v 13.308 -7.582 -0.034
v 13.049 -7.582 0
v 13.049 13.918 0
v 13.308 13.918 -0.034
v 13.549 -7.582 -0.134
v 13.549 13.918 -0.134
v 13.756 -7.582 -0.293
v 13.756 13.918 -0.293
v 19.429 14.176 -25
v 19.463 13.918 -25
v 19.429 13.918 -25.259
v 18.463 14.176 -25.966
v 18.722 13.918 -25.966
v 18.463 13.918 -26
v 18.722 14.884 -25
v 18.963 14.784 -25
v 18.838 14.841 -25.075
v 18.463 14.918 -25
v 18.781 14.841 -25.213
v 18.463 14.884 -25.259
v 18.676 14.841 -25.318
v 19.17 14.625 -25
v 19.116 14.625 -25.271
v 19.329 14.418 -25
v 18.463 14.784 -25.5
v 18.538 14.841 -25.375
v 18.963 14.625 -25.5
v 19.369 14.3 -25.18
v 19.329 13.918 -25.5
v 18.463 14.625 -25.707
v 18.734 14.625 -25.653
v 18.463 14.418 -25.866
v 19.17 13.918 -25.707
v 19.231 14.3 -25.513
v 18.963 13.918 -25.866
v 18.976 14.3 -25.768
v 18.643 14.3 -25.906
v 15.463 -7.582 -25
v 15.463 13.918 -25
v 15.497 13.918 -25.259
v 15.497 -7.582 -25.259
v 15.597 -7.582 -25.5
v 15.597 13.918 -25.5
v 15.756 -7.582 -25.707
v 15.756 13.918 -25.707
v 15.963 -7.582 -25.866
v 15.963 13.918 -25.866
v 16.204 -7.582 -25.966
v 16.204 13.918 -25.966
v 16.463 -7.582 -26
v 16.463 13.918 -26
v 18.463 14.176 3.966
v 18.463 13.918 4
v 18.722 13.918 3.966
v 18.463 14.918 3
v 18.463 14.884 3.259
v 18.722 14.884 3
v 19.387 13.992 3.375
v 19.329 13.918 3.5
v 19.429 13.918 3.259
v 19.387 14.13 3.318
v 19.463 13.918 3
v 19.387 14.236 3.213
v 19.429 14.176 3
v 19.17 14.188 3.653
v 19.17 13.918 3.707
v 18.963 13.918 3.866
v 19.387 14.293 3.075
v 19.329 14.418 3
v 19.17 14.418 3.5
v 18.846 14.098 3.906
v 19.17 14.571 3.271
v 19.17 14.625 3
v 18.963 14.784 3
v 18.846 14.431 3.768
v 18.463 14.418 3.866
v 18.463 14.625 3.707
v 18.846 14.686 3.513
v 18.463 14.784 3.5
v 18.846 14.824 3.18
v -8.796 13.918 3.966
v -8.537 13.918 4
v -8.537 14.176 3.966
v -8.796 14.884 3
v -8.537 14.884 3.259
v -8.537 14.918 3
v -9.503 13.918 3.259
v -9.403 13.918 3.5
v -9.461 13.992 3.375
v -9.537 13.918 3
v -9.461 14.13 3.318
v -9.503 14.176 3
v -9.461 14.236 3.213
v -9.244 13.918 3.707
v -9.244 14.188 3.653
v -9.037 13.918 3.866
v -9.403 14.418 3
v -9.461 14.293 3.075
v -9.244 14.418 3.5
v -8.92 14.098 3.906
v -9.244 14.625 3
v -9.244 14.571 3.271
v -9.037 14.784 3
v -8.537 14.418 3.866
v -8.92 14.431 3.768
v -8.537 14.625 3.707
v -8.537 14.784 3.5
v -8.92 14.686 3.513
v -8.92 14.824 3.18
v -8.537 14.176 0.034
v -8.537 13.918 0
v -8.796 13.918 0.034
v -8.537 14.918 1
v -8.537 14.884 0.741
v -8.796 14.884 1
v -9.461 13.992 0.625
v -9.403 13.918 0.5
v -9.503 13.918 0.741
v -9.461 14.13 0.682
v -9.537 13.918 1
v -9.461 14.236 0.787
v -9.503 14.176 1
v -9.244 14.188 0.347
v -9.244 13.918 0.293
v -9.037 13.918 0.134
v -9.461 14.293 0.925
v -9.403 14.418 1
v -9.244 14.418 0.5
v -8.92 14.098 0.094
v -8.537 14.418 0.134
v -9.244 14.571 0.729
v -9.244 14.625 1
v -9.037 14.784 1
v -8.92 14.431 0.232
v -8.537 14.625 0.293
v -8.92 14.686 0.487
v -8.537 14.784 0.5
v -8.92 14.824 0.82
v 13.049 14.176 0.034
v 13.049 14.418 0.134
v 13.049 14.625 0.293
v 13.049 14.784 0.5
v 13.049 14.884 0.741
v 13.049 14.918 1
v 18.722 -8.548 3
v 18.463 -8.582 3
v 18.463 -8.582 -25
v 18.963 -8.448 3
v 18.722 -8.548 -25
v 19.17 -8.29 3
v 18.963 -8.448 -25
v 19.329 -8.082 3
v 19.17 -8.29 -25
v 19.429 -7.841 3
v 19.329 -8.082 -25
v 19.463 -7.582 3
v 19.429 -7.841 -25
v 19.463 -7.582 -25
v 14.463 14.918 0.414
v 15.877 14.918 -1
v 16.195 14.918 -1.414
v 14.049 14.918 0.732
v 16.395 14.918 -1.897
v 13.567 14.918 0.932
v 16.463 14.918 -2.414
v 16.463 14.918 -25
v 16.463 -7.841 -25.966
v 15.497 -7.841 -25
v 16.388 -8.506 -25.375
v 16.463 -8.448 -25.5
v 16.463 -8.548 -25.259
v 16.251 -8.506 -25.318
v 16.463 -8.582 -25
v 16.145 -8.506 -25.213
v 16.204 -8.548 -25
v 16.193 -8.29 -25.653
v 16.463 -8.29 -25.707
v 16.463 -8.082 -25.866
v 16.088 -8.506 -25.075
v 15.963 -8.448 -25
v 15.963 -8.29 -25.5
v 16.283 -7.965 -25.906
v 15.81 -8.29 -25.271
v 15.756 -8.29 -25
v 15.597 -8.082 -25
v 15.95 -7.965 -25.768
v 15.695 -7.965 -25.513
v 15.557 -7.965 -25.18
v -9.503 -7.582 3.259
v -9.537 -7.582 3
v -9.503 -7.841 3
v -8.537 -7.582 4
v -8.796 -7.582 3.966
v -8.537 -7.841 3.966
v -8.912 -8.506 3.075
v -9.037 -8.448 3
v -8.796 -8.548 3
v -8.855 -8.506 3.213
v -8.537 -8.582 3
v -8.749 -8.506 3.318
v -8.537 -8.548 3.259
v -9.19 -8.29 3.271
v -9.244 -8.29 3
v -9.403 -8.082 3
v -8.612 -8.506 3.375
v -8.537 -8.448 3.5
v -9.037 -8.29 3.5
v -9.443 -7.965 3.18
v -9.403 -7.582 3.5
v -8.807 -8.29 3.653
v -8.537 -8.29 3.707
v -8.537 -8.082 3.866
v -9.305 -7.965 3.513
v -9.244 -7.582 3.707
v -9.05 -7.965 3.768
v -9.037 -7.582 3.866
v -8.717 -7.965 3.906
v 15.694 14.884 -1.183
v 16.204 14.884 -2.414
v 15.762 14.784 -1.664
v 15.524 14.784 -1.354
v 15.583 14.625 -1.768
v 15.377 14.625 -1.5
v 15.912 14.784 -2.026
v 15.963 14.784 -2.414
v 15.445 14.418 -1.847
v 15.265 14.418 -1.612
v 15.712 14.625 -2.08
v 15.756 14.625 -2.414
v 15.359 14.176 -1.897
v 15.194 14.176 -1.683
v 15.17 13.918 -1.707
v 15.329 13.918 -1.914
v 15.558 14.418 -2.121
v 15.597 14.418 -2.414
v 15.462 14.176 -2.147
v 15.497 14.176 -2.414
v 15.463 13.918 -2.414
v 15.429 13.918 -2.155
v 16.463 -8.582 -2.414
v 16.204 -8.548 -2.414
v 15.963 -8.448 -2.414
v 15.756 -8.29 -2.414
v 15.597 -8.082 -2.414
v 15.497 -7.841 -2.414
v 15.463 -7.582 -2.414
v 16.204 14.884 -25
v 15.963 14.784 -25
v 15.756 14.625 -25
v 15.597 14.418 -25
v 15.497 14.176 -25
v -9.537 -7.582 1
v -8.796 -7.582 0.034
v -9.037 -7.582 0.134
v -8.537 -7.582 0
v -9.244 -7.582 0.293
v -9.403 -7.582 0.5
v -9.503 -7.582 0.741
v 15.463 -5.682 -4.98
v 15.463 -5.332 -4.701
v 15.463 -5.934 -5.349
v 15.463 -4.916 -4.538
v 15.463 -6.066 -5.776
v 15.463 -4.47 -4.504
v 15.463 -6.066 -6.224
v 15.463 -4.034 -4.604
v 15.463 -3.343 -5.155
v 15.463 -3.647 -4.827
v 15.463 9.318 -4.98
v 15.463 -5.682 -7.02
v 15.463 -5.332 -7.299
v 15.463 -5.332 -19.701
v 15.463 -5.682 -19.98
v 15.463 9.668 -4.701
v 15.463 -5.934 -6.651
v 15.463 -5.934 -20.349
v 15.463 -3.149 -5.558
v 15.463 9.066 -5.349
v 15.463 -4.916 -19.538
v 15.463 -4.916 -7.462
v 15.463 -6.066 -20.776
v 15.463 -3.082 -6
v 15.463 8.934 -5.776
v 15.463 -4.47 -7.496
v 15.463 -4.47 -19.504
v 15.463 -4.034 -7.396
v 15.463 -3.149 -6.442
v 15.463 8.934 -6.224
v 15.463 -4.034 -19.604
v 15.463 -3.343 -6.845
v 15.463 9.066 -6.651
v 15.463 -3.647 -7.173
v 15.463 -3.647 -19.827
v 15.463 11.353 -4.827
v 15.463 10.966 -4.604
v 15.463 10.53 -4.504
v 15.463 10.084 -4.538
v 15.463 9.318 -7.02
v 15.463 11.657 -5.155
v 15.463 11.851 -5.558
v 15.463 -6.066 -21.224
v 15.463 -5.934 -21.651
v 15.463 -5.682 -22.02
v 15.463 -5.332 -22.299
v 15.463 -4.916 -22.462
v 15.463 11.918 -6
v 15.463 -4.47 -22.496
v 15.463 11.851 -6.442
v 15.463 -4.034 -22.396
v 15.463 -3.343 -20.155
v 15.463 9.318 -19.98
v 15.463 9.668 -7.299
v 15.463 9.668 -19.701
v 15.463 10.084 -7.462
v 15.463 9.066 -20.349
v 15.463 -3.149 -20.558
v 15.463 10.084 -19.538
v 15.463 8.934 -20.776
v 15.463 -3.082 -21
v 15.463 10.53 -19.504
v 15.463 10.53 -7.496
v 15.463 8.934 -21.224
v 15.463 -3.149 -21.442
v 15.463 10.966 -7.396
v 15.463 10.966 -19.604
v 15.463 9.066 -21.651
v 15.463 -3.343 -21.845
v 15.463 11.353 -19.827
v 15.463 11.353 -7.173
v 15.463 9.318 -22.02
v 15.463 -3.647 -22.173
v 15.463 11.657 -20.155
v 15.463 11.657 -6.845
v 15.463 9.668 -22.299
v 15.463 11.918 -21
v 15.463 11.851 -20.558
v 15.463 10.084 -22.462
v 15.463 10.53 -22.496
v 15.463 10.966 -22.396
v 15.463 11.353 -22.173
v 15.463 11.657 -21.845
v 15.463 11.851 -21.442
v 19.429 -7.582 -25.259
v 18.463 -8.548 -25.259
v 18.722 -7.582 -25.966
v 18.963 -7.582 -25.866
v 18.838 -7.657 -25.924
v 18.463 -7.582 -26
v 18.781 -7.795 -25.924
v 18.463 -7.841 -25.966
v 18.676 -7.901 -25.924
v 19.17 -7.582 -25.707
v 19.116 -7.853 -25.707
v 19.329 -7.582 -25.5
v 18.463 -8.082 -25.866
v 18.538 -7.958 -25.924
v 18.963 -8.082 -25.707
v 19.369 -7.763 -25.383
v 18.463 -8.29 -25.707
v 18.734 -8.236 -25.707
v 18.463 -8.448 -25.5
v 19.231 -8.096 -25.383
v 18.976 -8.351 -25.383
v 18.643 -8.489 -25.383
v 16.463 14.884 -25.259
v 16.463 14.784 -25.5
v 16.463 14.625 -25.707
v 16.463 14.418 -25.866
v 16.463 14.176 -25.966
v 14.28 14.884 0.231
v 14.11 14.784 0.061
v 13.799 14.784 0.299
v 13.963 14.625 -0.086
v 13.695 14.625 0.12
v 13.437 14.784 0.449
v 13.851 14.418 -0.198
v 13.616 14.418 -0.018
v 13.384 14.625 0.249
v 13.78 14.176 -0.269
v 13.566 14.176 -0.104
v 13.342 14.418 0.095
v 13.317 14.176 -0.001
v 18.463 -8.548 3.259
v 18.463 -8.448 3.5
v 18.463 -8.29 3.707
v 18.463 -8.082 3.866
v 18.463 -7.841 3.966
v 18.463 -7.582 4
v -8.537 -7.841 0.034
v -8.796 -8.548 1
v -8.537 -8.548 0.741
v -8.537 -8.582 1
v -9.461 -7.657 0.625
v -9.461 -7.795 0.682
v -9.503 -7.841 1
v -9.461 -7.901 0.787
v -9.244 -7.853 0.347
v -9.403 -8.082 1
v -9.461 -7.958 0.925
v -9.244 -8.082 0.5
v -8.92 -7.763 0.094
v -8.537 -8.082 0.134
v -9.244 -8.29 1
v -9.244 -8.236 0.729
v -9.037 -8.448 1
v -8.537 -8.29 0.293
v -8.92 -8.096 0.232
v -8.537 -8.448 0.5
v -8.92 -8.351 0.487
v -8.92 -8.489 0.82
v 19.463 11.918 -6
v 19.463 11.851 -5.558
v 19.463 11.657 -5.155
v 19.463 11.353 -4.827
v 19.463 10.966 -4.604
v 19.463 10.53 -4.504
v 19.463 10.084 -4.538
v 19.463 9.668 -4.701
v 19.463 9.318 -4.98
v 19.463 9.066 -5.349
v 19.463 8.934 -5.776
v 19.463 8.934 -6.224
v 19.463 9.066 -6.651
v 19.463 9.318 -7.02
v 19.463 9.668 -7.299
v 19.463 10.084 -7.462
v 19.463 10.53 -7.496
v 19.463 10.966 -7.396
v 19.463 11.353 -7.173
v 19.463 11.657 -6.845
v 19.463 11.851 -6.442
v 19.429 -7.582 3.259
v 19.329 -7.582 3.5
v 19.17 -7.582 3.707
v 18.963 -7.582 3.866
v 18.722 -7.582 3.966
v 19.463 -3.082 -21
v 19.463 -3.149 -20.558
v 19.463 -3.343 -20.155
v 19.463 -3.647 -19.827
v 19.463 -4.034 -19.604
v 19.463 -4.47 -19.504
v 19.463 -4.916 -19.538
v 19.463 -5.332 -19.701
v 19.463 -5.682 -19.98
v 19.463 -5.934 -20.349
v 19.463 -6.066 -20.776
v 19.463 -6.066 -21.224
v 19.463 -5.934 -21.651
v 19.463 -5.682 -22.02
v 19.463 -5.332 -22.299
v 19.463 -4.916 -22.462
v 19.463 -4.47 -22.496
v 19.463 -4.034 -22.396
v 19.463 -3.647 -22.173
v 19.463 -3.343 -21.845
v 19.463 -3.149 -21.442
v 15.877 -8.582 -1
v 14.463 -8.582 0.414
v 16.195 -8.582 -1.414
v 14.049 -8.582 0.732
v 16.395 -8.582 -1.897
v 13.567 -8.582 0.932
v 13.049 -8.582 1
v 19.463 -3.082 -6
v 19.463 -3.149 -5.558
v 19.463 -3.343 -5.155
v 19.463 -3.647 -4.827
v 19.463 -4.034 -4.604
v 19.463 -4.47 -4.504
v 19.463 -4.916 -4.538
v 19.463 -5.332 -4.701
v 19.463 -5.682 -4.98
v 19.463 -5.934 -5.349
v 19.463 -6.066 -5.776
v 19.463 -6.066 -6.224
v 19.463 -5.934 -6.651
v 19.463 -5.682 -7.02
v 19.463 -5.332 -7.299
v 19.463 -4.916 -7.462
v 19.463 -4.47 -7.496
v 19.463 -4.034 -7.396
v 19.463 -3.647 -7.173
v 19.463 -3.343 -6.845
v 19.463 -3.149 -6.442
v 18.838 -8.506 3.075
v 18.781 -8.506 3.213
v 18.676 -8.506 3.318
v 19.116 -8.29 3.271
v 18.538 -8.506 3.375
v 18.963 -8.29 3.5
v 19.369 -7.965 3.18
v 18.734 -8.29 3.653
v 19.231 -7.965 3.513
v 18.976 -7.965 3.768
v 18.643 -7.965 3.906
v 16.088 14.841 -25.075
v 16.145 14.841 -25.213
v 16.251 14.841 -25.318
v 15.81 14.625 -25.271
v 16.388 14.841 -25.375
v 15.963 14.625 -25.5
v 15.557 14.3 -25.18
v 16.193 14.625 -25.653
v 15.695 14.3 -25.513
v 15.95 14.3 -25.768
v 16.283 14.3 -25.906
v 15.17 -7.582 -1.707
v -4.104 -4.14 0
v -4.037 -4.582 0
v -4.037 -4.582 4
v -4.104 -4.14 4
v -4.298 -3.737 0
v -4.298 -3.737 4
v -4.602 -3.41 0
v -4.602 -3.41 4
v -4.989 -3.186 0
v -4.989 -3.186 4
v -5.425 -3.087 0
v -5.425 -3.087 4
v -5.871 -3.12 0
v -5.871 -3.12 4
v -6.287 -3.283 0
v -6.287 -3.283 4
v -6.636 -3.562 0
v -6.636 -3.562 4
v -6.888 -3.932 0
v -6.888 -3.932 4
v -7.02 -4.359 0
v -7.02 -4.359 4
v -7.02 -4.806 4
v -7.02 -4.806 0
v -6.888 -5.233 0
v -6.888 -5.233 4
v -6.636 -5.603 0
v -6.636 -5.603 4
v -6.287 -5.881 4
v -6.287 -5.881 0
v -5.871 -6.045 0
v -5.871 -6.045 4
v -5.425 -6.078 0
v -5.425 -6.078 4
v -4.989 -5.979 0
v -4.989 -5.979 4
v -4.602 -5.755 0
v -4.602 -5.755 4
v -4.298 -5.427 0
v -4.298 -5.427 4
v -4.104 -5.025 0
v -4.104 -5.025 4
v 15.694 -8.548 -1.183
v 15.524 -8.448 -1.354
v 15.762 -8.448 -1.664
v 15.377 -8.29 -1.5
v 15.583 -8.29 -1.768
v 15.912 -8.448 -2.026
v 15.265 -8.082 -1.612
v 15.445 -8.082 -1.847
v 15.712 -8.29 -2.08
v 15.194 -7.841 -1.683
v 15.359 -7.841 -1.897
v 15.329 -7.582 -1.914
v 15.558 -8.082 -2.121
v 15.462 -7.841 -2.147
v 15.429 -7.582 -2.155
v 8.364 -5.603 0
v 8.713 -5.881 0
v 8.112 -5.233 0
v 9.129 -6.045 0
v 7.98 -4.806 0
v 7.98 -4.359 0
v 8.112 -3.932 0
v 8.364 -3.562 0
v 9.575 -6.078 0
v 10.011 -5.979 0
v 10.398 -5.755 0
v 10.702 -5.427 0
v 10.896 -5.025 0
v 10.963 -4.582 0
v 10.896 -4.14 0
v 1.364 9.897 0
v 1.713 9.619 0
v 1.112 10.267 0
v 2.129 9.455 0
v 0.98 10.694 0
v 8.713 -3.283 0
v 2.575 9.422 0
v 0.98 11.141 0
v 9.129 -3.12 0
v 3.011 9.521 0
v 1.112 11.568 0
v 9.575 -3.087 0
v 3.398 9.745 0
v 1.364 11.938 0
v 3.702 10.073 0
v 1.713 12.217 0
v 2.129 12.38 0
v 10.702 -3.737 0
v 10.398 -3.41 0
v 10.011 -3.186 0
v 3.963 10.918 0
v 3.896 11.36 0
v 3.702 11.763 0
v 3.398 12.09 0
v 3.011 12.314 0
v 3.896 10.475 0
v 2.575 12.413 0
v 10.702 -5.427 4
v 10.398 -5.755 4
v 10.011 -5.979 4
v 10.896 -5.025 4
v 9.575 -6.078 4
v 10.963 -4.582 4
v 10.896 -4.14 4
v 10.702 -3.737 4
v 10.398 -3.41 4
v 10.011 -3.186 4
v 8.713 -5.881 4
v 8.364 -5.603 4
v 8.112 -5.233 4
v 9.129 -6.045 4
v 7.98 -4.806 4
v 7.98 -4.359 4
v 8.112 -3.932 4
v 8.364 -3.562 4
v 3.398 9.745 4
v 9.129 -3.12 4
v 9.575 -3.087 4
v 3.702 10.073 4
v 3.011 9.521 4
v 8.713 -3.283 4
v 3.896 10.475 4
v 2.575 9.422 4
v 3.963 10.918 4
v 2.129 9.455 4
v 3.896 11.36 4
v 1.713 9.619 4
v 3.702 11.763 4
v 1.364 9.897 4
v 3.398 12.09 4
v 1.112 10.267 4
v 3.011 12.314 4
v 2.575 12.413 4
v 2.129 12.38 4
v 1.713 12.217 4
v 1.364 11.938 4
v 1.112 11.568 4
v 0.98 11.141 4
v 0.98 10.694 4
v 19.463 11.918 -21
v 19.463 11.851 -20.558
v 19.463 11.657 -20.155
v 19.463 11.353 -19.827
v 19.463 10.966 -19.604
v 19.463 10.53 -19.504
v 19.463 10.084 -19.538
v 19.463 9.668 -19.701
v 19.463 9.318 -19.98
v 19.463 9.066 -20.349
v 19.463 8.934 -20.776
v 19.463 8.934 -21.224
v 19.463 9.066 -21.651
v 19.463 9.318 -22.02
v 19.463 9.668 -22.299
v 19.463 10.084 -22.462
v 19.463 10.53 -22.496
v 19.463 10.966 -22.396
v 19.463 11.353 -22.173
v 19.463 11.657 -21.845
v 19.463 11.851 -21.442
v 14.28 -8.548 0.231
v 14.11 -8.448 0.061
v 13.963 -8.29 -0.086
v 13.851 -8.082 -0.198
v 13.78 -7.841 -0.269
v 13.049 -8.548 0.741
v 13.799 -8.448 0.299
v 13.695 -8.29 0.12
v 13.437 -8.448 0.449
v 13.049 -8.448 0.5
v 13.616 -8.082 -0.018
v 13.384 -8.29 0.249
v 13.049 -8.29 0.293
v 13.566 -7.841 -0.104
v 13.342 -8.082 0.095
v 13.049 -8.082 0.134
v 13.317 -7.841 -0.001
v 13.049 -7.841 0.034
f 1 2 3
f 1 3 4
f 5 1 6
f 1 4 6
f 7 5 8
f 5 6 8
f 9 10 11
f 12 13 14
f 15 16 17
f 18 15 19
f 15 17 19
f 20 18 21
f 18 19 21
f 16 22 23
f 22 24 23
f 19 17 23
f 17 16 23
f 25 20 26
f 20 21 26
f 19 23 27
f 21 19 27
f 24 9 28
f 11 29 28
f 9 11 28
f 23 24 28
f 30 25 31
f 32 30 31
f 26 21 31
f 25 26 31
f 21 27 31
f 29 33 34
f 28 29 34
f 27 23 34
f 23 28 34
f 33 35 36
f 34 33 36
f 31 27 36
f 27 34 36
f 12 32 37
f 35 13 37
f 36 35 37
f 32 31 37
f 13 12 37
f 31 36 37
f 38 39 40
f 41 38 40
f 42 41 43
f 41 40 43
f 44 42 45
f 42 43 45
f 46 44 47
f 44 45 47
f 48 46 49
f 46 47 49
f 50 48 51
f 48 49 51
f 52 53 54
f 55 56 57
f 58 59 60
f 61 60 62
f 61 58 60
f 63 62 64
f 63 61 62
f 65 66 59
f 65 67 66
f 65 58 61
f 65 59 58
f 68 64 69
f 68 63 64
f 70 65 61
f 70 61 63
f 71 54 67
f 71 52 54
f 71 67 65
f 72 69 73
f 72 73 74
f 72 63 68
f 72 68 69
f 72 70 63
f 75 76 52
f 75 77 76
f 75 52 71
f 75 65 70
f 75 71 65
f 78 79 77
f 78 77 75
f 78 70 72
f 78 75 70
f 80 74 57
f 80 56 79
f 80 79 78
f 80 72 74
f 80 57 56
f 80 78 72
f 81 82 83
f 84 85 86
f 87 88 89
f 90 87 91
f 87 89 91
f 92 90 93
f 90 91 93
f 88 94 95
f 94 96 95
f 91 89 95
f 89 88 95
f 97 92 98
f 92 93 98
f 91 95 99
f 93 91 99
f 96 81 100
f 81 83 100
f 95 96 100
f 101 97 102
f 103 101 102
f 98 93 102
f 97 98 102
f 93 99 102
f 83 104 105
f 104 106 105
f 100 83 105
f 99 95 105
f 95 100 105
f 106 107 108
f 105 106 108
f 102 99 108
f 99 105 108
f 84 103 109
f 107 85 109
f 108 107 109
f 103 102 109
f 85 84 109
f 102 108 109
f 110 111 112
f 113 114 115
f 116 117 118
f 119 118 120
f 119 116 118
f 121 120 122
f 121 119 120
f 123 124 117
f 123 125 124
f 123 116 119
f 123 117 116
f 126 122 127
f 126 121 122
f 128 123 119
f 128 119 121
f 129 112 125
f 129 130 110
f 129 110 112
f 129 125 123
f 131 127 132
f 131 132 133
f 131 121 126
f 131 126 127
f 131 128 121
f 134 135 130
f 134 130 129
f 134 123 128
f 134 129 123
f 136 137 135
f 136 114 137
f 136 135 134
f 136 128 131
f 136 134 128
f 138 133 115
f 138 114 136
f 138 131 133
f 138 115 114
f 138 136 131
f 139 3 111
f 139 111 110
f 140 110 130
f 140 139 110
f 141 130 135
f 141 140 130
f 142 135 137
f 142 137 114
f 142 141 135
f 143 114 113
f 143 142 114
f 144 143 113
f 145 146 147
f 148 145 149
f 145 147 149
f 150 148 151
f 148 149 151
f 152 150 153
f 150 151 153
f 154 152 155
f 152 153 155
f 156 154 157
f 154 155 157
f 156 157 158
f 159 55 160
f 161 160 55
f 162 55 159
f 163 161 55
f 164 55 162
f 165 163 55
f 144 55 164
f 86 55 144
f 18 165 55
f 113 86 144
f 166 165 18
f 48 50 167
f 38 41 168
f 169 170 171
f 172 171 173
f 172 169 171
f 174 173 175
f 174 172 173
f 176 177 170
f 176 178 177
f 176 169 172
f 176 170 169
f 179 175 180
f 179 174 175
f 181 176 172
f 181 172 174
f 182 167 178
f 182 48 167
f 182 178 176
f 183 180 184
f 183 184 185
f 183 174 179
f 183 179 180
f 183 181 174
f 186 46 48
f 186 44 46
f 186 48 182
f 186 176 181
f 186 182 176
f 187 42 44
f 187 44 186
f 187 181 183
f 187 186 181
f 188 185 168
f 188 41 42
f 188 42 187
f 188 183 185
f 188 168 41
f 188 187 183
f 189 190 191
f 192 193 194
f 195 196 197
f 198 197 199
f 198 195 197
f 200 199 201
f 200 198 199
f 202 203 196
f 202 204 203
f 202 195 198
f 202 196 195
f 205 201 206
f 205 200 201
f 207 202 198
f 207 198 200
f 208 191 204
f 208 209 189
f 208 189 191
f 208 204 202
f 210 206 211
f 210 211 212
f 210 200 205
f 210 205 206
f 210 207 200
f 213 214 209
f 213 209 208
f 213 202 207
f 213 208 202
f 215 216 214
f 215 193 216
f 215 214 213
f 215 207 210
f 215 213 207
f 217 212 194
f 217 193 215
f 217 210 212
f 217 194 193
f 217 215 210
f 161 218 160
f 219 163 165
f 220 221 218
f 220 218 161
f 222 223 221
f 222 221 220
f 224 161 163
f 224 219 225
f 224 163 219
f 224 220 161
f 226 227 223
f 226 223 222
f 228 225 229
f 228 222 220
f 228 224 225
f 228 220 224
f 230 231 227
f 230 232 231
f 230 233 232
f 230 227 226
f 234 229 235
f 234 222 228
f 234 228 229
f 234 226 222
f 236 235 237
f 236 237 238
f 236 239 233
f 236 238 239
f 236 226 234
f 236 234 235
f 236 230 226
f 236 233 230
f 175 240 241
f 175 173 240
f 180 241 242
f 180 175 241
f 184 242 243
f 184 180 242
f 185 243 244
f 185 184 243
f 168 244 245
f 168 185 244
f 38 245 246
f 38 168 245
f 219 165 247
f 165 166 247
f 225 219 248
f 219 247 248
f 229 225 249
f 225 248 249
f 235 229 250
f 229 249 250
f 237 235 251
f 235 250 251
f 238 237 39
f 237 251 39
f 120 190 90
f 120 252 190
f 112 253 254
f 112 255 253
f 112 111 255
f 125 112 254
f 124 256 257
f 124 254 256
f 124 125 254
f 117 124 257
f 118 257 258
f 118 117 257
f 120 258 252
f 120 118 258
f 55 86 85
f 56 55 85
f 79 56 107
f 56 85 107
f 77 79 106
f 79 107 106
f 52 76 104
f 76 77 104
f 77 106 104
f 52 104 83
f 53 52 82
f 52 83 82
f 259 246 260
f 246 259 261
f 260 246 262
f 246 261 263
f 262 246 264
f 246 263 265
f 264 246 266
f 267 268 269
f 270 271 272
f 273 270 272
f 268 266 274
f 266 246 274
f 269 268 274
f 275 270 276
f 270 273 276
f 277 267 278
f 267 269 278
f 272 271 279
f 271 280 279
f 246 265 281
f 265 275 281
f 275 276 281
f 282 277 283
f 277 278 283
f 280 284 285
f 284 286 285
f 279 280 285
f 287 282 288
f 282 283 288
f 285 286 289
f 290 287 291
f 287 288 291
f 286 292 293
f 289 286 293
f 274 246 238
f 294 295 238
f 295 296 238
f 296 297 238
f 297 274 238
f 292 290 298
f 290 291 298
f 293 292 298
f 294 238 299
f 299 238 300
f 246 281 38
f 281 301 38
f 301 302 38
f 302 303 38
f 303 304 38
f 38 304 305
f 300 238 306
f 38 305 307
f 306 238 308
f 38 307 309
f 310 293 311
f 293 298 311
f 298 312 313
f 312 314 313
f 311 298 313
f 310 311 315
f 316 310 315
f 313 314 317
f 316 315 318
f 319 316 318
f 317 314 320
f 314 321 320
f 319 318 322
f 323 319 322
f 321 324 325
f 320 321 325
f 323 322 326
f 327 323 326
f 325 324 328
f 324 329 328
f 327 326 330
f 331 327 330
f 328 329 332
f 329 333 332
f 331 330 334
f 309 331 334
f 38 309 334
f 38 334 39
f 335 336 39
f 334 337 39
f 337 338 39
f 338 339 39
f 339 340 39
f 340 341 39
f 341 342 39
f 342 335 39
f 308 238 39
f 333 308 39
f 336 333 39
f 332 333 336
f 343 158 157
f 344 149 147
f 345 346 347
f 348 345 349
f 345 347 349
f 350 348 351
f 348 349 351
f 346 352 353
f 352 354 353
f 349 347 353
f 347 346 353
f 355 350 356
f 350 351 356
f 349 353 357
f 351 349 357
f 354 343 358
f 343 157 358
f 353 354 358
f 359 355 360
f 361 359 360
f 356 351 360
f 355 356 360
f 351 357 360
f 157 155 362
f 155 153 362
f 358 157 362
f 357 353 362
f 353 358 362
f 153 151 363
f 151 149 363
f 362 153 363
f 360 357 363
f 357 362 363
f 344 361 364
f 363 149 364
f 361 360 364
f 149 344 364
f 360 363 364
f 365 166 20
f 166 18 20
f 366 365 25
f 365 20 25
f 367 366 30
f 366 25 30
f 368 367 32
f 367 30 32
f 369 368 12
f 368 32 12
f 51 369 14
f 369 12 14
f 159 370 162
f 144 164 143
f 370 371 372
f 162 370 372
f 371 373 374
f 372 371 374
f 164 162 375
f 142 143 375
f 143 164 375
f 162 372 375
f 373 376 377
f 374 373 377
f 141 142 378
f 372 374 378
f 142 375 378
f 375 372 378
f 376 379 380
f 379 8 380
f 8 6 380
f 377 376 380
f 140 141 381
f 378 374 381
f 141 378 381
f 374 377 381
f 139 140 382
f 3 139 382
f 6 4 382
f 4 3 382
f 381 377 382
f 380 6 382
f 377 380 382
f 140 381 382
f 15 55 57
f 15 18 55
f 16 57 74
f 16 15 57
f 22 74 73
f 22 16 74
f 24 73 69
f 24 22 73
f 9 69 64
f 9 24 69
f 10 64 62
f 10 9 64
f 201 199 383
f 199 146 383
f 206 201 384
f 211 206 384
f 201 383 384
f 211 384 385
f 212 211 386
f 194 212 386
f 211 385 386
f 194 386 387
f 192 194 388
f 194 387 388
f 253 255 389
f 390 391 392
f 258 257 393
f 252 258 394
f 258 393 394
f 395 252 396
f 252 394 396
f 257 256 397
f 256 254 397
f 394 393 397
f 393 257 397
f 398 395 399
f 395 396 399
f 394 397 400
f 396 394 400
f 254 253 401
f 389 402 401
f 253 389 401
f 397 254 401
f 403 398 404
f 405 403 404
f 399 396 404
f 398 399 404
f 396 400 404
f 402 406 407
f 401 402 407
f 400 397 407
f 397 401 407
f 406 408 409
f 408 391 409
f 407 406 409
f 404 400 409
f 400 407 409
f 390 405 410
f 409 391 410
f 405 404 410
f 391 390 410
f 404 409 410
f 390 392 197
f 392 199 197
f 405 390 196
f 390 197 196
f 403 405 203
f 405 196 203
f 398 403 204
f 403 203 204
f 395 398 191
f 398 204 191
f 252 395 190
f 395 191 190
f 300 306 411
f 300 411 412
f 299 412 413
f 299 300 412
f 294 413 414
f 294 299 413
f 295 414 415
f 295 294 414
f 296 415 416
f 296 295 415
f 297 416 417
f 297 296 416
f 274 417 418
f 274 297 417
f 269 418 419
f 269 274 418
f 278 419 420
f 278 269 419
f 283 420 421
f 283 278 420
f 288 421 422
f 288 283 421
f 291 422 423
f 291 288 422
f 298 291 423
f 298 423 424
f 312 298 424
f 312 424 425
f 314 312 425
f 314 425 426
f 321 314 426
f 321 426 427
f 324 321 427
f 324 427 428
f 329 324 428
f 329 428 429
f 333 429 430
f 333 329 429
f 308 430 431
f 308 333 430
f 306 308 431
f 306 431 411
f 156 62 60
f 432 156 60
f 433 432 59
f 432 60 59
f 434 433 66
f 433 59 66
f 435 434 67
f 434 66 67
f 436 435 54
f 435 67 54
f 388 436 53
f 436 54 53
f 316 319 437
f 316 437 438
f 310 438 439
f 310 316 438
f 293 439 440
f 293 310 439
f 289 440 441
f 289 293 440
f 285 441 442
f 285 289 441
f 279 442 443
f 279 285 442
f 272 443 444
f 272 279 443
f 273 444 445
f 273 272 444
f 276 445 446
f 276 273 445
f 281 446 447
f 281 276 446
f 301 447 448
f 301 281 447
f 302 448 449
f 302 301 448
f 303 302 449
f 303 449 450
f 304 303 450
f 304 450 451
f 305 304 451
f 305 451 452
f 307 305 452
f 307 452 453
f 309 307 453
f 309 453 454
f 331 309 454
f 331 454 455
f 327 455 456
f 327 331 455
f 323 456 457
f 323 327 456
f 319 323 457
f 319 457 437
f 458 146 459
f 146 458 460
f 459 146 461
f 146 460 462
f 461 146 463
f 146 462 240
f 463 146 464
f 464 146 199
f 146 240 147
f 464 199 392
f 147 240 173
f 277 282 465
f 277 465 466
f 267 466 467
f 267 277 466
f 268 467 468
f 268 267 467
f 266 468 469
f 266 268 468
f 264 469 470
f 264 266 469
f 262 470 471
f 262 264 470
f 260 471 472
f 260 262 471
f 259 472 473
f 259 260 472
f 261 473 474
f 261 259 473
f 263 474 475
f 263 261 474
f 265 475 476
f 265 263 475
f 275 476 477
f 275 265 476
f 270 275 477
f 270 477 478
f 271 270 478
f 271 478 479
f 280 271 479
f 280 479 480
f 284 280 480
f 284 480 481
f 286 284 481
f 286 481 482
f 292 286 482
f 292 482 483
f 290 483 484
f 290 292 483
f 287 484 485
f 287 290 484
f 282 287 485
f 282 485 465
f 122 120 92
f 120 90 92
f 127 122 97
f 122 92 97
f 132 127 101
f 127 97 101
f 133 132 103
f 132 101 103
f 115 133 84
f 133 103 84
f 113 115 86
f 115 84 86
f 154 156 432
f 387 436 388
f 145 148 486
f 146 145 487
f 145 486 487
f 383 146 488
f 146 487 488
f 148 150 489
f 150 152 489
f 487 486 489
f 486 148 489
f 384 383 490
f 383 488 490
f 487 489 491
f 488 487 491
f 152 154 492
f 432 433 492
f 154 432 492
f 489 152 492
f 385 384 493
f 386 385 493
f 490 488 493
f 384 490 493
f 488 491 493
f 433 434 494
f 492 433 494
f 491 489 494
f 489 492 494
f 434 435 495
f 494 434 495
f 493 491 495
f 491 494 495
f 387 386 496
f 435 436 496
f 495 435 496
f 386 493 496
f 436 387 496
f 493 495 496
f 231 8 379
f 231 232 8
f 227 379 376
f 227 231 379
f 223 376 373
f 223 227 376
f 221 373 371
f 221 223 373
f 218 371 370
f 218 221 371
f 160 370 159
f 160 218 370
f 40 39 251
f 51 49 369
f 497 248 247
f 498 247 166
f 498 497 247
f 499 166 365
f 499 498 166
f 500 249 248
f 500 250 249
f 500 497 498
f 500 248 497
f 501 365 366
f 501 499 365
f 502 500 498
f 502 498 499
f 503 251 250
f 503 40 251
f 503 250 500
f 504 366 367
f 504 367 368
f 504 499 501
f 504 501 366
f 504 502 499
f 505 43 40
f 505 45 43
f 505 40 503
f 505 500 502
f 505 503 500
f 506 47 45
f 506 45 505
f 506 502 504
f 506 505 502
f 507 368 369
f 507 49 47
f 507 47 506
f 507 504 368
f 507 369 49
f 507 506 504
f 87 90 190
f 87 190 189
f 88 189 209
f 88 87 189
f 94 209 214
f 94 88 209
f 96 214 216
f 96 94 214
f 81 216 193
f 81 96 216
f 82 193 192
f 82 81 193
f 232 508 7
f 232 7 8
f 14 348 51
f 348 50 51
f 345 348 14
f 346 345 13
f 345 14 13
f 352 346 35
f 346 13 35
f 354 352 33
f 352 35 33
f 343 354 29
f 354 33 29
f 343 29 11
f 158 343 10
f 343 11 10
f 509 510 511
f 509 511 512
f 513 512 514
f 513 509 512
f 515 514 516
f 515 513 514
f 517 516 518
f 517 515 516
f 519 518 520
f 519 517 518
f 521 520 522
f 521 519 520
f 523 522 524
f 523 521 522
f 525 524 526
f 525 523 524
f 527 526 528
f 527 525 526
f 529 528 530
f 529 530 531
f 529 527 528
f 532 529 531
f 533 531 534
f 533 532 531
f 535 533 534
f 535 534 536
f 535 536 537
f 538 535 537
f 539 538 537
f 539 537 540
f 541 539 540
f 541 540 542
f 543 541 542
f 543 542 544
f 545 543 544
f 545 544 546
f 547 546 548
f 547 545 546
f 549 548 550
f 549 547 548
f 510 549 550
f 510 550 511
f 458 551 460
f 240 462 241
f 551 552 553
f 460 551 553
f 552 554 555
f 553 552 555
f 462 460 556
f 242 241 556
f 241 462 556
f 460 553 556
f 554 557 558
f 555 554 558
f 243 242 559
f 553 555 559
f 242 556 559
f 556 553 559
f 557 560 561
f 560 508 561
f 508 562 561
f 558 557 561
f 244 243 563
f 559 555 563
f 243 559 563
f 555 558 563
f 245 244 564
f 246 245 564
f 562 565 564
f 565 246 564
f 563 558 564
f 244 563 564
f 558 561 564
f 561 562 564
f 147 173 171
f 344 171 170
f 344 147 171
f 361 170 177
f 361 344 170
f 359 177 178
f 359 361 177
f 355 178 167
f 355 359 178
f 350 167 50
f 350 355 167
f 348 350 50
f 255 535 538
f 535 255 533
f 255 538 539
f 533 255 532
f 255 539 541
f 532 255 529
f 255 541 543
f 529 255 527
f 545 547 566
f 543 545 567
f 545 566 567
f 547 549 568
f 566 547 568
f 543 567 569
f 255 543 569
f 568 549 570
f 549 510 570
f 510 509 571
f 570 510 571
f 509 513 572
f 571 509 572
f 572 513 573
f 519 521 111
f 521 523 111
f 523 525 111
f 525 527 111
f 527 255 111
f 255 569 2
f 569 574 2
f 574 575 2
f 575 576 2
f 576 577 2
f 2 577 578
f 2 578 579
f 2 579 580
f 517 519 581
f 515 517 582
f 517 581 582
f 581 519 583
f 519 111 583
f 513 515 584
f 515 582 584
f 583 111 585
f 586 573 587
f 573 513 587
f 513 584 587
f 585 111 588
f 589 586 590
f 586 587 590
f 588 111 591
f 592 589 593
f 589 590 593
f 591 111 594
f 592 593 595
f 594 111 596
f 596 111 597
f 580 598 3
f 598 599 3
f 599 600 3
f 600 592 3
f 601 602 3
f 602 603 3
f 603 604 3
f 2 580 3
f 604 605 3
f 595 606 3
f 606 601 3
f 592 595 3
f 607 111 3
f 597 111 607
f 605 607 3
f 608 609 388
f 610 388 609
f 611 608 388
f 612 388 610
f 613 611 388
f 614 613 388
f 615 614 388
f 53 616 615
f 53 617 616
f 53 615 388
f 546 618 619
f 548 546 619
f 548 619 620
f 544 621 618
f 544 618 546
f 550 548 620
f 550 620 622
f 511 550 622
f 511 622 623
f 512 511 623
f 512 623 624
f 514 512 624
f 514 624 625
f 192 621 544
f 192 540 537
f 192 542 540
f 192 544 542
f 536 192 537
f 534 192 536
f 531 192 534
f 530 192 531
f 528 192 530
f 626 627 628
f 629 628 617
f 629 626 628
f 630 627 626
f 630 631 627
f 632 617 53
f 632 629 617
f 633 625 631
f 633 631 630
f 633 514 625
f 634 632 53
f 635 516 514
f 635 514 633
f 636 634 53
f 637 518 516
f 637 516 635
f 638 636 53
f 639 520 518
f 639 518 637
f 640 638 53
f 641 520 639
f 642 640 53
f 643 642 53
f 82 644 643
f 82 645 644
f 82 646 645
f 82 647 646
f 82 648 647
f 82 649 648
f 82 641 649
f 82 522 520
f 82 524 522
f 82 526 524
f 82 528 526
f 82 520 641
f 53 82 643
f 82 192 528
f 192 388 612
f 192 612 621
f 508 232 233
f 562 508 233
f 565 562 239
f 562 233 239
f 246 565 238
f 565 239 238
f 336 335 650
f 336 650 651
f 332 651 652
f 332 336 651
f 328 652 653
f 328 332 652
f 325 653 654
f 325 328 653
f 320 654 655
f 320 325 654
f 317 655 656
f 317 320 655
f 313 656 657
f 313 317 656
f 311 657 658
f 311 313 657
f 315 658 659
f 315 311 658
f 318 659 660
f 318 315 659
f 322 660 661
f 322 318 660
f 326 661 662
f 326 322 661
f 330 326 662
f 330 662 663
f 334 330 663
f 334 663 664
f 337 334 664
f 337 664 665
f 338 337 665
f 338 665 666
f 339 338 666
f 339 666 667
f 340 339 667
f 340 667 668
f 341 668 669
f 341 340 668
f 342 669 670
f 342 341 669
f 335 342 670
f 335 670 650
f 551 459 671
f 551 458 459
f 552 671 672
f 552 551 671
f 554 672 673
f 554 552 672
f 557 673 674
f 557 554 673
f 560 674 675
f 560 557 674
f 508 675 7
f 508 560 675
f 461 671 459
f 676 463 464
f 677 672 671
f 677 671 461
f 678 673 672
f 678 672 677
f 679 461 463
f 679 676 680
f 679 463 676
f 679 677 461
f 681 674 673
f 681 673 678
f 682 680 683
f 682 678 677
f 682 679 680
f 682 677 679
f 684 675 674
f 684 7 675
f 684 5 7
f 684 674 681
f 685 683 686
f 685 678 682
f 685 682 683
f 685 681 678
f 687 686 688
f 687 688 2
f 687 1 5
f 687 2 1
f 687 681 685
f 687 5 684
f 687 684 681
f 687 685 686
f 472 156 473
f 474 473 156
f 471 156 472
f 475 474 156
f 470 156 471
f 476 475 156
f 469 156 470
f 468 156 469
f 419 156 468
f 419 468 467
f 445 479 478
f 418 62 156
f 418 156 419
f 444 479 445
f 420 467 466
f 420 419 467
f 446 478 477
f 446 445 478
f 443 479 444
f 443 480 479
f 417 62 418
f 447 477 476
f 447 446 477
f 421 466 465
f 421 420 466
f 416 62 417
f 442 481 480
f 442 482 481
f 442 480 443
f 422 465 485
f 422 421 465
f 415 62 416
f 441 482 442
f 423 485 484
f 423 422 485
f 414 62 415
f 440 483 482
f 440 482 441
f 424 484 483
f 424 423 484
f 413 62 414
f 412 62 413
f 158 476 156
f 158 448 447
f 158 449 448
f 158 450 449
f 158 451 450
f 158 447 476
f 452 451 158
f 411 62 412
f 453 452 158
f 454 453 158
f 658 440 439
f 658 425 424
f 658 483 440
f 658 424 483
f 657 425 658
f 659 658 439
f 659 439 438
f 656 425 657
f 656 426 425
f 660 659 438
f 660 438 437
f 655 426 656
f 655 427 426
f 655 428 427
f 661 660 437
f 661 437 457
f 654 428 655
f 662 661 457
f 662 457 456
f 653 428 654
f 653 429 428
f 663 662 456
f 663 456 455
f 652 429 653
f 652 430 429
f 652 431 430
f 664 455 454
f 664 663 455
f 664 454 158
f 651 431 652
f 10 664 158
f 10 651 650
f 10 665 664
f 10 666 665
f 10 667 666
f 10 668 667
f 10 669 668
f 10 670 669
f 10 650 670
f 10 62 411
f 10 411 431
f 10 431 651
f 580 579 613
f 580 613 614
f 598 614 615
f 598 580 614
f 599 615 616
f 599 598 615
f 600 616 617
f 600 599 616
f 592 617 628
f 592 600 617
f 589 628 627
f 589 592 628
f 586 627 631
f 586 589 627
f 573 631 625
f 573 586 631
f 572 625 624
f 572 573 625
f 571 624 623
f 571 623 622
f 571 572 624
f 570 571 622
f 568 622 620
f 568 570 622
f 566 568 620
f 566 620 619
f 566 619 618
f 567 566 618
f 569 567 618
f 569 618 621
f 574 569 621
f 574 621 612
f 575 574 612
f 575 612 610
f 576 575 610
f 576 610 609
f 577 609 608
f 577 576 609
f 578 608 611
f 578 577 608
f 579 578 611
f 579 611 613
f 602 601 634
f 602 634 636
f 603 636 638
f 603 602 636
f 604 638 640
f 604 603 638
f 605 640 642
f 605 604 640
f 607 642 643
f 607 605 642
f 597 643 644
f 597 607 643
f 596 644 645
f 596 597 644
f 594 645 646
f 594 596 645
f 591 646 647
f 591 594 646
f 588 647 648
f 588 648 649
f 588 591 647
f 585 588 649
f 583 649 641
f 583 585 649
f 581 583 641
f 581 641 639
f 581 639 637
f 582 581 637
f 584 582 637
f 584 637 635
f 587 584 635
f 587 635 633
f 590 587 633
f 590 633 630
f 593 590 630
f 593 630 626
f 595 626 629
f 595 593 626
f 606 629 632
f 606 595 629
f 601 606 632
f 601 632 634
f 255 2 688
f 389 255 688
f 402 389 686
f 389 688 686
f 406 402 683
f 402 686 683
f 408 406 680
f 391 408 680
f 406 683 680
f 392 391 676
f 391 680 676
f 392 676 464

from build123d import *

# Parameters (mm, degrees)
SKETCH_1_W      = 25
SKETCH_1_H      = 23.5
SKETCH_1_R      = 1.5
EXTRUDE_1_DEPTH = 4
SKETCH_2_W      = 30
SKETCH_2_H      = 23.5
SKETCH_2_R      = 1.5
EXTRUDE_2_DEPTH = 4
CHAMFER_1_SIZE  = 2
FILLET_1_R      = 1


with BuildPart() as part:
    # 草图1 → 凸台-拉伸1 (new body)
    with BuildSketch(Plane.XY):
        with Locations((2.963131814, 3.167575845)):
            Rectangle(SKETCH_1_W, SKETCH_1_H)
        with Locations((2.463131814, 10.917575845)):
            Circle(SKETCH_1_R, mode=Mode.SUBTRACT)
        with Locations((-5.536868186, -4.582424155)):
            Circle(SKETCH_1_R, mode=Mode.SUBTRACT)
        with Locations((9.463131814, -4.582424155)):
            Circle(SKETCH_1_R, mode=Mode.SUBTRACT)
    extrude(amount=EXTRUDE_1_DEPTH)

    # 草图2 → 凸台-拉伸2 (add)
    with BuildSketch(Plane(origin=(15.463131814, 0, 0), x_dir=(0, 0, -1), z_dir=(1, 0, 0))):
        with Locations((11, 3.167575845)):
            Rectangle(SKETCH_2_W, SKETCH_2_H)
        with Locations(Location((6, 10.417575845, 0), (0, 0, 90))):
            Circle(SKETCH_2_R, mode=Mode.SUBTRACT)
        with Locations(Location((21, 10.417575845, 0), (0, 0, 90))):
            Circle(SKETCH_2_R, mode=Mode.SUBTRACT)
        with Locations(Location((6, -4.582424155, 0), (0, 0, 90))):
            Circle(SKETCH_2_R, mode=Mode.SUBTRACT)
        with Locations(Location((21, -4.582424155, 0), (0, 0, 90))):
            Circle(SKETCH_2_R, mode=Mode.SUBTRACT)
    extrude(amount=EXTRUDE_2_DEPTH)

    # 倒角1
    chamfer_1_edges = [part.edges().sort_by_distance(p)[0] for p in [
        (15.463131814, 3.167575845, 0),
    ]]
    chamfer(chamfer_1_edges, length=CHAMFER_1_SIZE)

    # 圆角1
    fillet_1_edges = [part.edges().sort_by_distance(p)[0] for p in [
        (4.963131814, 14.917575845, 4),
        (19.463131814, 3.167575845, 4),
        (19.463131814, -8.582424155, -11),
        (19.463131814, 3.167575845, -26),
        (19.463131814, 14.917575845, -11),
        (15.463131814, 3.167575845, -26),
        (17.463131814, -8.582424155, -26),
        (15.463131814, 14.917575845, -14),
        (17.463131814, 14.917575845, -26),
        (15.463131814, -8.582424155, -14),
        (15.463131814, 3.167575845, -2),
        (1.963131814, 14.917575845, 0),
        (-9.536868186, 3.167575845, 4),
        (13.463131814, 3.167575845, 0),
        (14.463131814, 14.917575845, -1),
        (14.463131814, -8.582424155, -1),
        (1.963131814, -8.582424155, 0),
        (-9.536868186, 3.167575845, 0),
        (-9.536868186, 14.917575845, 2),
        (-9.536868186, -8.582424155, 2),
        (4.963131814, -8.582424155, 4),
    ]]
    fillet(fillet_1_edges, radius=FILLET_1_R)


solid = part.part
